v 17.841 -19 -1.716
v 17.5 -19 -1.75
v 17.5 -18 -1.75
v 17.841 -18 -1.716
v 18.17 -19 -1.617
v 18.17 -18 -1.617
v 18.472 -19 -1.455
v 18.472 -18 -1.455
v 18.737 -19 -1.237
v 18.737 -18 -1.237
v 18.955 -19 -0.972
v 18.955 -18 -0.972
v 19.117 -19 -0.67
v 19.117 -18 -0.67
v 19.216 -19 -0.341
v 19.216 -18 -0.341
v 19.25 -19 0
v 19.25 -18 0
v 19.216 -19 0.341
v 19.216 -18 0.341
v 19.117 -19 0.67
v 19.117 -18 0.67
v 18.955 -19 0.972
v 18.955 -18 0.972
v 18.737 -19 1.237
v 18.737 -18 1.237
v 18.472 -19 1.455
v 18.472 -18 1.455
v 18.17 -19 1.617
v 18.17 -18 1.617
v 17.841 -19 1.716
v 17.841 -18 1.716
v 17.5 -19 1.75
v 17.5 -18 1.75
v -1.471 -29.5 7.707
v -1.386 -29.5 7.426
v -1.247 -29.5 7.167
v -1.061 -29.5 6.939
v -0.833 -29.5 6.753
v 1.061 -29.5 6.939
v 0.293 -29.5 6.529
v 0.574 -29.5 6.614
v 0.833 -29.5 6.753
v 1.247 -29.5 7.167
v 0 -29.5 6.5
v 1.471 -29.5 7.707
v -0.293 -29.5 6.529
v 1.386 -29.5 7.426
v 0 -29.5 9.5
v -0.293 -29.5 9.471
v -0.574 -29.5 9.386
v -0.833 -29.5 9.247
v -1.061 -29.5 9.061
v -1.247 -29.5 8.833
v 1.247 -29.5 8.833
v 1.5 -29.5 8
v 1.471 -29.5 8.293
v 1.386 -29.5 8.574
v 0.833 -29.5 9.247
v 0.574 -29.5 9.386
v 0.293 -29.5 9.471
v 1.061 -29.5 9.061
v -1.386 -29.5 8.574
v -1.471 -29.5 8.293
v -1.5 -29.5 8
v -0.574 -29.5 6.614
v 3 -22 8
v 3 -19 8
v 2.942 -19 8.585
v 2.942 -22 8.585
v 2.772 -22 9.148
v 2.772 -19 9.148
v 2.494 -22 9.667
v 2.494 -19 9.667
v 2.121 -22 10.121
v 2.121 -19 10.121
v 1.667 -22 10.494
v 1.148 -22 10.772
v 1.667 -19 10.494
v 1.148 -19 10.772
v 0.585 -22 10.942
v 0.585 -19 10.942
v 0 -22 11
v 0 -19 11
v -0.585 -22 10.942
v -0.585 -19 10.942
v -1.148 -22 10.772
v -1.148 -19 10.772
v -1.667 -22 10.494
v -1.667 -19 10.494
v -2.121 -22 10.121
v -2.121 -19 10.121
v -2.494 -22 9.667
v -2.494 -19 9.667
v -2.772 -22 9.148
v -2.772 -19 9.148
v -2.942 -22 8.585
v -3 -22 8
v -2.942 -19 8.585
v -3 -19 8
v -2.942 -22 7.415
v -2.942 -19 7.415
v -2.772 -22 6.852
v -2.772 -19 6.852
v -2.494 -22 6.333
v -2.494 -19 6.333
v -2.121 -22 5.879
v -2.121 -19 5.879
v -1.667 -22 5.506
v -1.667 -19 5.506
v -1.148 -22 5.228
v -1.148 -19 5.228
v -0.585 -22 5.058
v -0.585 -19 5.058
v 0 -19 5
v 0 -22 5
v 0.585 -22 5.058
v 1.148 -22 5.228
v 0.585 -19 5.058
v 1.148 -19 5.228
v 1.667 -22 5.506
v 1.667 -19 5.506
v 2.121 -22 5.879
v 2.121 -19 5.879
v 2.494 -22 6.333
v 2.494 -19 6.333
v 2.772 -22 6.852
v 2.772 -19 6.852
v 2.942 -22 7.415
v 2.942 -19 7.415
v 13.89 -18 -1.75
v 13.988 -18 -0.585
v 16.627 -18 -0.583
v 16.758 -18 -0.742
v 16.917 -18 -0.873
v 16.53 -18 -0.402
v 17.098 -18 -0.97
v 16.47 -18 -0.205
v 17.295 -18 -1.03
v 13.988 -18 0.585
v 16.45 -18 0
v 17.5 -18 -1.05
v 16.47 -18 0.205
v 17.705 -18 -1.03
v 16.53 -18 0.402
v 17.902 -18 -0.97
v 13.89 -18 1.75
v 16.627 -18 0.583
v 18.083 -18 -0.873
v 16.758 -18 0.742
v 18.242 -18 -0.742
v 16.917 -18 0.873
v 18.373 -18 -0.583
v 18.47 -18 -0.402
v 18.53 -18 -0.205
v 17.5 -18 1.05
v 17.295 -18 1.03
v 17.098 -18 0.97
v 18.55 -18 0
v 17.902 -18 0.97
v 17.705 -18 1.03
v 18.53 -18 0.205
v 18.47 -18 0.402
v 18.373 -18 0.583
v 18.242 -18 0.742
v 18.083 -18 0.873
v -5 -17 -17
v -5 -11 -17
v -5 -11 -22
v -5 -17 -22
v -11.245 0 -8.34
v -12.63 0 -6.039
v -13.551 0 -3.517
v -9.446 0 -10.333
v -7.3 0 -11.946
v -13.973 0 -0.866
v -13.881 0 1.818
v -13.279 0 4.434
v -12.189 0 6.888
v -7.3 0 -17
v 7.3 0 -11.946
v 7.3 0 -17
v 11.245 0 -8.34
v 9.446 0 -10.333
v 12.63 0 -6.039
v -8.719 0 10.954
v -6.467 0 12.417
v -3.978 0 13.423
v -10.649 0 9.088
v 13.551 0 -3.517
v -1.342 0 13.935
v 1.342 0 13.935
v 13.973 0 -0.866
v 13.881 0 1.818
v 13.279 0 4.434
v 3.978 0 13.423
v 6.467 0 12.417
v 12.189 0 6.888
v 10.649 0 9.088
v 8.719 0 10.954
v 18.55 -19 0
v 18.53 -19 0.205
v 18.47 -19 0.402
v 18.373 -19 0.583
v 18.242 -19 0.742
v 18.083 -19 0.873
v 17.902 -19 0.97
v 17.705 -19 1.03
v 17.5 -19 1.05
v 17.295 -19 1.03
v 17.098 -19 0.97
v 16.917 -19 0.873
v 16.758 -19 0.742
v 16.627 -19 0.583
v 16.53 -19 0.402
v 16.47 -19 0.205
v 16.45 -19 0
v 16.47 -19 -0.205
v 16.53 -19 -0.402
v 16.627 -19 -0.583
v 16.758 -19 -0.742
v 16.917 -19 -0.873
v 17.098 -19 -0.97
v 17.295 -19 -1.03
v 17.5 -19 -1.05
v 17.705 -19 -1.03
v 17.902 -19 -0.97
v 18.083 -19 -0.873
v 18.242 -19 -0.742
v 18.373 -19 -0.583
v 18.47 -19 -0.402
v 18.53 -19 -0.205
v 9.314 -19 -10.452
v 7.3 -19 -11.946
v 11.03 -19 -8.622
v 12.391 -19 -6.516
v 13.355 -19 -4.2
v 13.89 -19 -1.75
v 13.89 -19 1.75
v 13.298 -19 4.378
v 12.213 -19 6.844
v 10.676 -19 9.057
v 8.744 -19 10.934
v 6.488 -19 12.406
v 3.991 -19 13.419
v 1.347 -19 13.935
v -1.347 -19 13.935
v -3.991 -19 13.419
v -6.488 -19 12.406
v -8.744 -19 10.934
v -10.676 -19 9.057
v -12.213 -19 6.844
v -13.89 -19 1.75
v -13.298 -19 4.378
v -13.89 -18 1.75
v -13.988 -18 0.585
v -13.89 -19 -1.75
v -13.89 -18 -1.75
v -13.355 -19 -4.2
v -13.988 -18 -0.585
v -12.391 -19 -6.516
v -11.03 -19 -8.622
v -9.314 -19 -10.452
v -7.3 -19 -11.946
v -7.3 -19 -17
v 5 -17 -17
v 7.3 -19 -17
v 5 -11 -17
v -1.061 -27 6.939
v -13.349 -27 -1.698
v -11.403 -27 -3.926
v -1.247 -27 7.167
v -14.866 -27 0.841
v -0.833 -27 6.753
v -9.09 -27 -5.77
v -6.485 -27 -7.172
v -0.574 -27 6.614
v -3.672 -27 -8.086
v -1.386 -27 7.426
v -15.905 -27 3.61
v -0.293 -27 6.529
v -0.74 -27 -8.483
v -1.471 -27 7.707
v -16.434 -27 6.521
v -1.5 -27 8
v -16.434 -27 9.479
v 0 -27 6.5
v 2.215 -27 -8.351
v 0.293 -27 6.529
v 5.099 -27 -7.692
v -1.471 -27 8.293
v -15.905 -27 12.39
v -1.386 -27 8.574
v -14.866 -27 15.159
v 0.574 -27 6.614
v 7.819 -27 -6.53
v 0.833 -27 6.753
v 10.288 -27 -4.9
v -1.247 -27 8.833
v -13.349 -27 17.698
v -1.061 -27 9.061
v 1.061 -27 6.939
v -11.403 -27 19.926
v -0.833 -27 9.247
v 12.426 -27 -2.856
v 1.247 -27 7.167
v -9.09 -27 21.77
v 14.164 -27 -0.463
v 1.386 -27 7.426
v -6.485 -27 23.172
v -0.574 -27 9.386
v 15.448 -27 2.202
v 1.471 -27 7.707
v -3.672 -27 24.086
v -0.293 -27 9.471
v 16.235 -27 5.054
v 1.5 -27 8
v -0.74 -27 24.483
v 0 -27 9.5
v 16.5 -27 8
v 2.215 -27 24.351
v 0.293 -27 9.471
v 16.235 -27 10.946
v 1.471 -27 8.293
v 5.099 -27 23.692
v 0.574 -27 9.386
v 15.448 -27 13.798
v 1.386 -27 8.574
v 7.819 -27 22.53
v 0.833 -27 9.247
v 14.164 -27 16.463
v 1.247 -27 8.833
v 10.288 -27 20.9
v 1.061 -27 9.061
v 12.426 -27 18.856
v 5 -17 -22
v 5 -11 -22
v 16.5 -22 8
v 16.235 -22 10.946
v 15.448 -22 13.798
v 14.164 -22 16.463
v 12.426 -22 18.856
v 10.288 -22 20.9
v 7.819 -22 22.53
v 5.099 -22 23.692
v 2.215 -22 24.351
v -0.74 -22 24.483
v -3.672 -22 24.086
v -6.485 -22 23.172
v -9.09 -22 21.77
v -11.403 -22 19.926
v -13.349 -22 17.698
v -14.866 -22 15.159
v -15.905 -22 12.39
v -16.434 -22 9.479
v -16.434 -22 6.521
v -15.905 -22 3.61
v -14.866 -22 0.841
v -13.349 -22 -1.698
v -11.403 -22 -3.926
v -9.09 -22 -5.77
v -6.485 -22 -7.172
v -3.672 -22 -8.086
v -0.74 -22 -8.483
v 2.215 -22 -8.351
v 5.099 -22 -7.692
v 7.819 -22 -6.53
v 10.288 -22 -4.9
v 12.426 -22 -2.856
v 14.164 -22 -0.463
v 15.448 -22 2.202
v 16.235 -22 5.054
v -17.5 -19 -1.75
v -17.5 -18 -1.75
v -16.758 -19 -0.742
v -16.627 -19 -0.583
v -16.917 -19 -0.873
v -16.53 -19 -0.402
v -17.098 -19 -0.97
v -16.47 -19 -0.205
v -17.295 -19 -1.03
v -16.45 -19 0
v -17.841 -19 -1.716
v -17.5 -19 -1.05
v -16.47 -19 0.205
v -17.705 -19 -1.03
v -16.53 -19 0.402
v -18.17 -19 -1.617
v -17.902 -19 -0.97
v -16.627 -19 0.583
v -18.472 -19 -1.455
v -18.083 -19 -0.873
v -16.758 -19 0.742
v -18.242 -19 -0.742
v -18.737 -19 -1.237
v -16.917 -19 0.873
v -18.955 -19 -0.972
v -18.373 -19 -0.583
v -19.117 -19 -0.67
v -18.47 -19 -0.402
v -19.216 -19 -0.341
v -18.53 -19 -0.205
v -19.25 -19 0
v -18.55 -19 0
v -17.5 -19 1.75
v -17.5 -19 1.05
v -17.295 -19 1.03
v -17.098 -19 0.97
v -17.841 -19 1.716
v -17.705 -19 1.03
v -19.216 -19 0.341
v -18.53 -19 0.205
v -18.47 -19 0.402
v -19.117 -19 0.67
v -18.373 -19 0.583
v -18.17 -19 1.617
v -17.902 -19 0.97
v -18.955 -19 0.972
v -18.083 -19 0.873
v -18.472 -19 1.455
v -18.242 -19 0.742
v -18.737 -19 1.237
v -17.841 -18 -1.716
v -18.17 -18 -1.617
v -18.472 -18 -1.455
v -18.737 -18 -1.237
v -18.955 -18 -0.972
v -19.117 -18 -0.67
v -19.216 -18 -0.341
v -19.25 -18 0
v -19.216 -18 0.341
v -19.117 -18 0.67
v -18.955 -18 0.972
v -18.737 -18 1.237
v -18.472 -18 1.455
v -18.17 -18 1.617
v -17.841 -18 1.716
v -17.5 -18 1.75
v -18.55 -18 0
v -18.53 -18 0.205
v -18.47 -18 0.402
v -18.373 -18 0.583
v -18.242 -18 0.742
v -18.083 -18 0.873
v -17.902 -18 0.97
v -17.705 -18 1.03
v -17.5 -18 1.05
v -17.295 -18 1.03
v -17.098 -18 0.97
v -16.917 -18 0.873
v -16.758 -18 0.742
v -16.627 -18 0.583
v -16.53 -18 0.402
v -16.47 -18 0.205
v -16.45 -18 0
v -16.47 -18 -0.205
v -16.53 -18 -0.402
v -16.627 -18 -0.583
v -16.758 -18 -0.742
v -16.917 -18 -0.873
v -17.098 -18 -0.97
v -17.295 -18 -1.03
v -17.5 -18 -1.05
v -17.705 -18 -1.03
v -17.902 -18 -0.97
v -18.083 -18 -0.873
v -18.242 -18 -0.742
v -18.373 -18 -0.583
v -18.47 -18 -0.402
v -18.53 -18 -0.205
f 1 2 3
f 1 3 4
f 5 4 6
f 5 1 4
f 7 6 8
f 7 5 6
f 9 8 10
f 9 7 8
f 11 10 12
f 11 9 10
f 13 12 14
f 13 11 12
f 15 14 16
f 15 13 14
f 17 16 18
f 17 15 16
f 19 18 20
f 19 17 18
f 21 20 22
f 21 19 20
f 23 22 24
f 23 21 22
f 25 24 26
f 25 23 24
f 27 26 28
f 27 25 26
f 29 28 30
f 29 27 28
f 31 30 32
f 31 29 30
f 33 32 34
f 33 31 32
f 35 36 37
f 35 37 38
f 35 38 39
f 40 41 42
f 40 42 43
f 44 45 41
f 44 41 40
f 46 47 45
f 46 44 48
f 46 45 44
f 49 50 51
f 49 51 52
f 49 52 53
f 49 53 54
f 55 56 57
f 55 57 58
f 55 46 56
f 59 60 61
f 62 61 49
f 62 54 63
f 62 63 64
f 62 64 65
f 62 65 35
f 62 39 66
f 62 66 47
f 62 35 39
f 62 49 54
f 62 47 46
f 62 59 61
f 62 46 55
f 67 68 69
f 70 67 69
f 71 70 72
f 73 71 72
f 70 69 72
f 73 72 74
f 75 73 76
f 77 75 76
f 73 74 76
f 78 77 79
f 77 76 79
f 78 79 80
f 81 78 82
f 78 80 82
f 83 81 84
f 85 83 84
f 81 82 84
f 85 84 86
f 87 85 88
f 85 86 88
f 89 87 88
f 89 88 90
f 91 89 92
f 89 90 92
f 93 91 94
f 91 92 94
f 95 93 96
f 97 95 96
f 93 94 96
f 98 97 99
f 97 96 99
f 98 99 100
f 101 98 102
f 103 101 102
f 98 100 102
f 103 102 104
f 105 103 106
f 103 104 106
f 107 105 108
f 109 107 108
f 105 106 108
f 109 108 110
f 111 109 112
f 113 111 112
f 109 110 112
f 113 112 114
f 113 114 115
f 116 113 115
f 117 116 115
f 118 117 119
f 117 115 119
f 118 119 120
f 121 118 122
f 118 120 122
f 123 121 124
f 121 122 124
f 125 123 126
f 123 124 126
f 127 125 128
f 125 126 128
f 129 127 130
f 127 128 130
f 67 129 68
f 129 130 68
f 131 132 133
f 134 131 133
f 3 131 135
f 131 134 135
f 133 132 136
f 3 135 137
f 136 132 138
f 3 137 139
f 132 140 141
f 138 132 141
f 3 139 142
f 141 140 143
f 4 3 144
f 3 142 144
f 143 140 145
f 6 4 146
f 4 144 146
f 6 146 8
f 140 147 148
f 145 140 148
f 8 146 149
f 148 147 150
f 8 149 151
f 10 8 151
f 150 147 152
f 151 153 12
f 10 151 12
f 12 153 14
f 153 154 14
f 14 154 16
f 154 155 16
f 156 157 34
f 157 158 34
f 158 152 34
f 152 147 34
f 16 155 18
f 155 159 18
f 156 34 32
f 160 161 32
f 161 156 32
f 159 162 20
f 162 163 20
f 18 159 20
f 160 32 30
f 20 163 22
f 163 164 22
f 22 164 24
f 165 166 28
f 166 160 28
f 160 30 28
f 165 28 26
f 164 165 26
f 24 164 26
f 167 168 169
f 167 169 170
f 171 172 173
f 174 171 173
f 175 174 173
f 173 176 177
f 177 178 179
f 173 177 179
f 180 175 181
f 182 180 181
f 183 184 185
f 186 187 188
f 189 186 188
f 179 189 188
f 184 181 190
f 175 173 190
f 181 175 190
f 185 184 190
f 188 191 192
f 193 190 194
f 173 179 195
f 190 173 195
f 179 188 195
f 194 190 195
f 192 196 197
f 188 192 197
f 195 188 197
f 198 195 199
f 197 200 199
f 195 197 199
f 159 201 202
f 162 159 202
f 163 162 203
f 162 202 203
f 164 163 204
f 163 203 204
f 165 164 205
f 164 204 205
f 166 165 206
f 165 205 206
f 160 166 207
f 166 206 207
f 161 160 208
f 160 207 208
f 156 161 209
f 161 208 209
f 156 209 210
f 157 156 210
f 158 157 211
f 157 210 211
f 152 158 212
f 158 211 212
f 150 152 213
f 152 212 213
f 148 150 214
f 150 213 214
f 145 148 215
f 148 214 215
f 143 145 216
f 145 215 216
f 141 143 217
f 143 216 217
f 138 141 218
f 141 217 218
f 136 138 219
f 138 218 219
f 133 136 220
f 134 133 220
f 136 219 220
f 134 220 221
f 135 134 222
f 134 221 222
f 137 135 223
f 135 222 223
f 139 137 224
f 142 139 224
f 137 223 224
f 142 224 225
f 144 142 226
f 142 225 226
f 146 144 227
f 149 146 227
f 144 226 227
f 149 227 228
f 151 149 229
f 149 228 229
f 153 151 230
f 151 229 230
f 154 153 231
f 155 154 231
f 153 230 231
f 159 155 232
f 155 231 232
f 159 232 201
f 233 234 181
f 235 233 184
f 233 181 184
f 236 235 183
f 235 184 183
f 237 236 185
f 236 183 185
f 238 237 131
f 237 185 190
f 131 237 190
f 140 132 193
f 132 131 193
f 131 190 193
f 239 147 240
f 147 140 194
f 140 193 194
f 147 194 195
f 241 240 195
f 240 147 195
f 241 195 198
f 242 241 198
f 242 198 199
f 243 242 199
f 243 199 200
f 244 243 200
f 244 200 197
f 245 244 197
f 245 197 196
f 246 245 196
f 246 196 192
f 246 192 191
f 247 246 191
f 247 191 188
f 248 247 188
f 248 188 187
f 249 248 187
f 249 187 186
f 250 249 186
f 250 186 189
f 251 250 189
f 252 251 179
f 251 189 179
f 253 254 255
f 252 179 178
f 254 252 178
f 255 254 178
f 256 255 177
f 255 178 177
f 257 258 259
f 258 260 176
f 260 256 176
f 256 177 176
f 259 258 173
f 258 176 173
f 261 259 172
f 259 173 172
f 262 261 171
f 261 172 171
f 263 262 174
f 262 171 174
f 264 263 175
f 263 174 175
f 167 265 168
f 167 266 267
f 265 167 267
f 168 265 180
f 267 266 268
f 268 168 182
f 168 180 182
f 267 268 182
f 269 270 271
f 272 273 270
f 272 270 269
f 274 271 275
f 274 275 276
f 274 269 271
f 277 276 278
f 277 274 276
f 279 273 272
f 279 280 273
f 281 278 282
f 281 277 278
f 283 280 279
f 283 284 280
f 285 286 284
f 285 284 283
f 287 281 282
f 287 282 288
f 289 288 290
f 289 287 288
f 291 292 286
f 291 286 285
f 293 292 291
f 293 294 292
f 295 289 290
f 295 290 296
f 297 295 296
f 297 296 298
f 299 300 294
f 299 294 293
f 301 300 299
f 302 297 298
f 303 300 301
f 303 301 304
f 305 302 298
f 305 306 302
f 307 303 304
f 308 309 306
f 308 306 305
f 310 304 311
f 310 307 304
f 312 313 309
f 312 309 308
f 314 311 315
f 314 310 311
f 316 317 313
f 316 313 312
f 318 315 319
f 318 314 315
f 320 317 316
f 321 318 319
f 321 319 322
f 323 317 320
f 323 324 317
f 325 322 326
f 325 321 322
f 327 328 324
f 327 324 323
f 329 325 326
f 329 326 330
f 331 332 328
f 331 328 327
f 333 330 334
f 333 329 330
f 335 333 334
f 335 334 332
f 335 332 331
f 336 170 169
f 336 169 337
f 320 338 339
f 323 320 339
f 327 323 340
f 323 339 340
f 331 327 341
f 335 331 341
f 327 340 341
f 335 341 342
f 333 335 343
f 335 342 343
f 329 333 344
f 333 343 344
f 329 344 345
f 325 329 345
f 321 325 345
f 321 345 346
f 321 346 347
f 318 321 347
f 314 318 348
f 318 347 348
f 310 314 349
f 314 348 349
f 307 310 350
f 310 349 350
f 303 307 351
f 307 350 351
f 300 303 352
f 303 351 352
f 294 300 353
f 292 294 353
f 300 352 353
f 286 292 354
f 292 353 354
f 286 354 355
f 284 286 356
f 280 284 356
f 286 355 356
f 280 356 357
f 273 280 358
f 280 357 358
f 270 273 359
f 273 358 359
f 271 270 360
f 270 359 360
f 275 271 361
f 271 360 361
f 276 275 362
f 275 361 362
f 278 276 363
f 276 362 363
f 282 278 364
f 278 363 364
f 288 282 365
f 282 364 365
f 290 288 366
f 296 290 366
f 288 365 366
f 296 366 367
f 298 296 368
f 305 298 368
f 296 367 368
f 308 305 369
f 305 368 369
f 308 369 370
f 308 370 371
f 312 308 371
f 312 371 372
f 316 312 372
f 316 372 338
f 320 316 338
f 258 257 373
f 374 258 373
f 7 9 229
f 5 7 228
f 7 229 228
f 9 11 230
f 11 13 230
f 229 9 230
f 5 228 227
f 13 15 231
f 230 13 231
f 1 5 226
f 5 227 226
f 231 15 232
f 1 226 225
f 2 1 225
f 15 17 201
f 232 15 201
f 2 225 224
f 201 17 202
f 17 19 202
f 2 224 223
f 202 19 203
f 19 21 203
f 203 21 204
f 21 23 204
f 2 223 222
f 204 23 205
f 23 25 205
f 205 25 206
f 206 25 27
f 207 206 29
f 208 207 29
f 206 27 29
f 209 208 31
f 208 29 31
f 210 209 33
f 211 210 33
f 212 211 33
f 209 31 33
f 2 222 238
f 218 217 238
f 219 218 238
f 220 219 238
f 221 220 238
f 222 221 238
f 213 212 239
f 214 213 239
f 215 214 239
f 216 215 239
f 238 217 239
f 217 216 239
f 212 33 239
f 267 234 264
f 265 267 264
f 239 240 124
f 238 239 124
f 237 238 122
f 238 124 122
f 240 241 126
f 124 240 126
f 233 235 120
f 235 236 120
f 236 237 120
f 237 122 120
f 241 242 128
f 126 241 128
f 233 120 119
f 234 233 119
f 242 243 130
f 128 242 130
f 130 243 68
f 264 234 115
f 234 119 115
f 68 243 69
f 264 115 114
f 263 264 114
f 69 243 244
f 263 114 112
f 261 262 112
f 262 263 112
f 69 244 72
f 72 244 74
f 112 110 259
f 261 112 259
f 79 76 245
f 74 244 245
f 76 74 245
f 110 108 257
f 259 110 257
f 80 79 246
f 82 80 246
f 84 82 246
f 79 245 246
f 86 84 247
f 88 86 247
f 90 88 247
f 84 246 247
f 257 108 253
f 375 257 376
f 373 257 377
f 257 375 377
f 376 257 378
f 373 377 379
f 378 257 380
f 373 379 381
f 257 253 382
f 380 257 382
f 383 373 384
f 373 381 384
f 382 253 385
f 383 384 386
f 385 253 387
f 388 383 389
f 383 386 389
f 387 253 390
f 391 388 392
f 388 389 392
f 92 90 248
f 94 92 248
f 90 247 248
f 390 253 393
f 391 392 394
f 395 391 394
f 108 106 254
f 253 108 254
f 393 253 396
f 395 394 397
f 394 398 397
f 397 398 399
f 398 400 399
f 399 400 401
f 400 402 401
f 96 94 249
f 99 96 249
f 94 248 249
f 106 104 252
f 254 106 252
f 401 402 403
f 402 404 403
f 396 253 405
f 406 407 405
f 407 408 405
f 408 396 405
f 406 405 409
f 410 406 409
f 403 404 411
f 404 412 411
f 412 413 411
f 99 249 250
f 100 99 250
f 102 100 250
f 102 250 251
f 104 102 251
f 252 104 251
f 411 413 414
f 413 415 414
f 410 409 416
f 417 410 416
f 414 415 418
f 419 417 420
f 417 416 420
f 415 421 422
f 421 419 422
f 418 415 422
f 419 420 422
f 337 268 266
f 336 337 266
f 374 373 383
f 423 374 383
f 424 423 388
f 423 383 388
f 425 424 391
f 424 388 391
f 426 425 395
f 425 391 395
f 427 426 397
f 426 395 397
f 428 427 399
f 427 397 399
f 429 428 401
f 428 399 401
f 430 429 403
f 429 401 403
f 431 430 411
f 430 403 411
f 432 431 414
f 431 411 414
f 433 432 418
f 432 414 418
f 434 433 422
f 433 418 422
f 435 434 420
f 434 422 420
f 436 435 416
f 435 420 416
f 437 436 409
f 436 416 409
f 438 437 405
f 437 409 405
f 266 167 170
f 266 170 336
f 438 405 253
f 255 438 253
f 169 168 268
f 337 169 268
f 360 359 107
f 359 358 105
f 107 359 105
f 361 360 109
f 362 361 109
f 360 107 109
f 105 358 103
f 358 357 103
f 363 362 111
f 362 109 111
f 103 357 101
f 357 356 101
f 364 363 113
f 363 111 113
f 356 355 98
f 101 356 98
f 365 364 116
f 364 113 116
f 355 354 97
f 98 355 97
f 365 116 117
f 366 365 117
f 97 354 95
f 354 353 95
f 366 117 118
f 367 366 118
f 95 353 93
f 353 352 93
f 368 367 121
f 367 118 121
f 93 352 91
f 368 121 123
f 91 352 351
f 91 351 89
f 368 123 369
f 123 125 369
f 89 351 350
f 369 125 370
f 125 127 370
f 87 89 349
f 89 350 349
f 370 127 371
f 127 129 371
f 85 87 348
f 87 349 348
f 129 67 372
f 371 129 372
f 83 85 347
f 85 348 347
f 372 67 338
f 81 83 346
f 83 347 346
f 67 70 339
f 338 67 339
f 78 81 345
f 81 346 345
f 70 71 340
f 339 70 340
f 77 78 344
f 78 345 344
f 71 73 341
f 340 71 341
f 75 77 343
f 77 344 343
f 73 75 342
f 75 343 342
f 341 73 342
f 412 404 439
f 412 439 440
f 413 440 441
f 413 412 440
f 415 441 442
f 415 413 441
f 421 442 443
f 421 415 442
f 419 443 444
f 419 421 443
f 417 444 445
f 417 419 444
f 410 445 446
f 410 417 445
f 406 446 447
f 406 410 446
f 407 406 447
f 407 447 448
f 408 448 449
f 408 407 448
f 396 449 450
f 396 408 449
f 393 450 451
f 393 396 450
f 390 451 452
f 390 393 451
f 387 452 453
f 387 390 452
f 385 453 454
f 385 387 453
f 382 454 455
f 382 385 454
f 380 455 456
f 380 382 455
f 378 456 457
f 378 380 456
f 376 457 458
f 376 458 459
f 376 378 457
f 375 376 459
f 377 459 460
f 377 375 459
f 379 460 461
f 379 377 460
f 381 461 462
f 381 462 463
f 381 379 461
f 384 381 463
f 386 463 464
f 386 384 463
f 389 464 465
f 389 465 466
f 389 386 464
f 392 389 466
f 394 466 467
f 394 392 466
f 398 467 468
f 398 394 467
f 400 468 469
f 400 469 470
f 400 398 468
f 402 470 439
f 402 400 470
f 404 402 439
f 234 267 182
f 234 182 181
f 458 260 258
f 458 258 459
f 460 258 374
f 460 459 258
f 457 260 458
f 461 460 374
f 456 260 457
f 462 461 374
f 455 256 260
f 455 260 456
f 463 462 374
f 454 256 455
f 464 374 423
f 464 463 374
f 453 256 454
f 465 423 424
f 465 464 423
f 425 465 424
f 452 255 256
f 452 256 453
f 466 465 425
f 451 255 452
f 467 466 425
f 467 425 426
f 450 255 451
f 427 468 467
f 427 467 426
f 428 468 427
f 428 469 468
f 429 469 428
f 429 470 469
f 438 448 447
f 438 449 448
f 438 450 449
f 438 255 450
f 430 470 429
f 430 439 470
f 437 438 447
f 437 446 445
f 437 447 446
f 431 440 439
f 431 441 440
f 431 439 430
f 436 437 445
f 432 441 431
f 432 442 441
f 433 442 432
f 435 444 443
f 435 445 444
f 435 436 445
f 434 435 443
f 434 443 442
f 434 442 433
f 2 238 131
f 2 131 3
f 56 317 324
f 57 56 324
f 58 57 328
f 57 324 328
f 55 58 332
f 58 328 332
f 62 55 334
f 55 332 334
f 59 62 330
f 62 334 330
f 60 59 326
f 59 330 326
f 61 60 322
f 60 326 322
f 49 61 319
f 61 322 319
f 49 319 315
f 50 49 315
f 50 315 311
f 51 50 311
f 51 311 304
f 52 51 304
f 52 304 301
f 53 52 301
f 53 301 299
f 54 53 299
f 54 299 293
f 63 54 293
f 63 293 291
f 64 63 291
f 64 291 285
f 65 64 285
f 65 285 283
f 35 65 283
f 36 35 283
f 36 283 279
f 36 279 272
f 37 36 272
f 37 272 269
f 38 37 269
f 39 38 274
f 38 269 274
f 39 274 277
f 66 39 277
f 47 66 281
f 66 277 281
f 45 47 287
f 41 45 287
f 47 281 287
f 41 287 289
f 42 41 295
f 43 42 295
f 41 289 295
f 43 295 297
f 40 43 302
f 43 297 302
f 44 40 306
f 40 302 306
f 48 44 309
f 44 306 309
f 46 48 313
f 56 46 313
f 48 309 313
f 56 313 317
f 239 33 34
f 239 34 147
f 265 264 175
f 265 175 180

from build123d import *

# Parameters (mm, degrees)
F1_DEPTH  = 19
F2_R      = 3
F3_DEPTH  = 3
F4_R      = 1.5
F5_DEPTH  = 7.5
F6_R      = 1.05
F7_DEPTH  = 1
F8_R      = 16.5
F9_DEPTH  = 5
F10_W     = 10
F10_H     = 6
F11_DEPTH = 5


# Not quite as in the source:
# - a pattern or mirror of a feature is missing from the dataset's text; its kind, count and spacing are read off the source's solid


with BuildPart() as f1:
    # F0 (on Front) → F1 (new body)
    with BuildSketch(Plane.XZ):
        with BuildLine():
            Line((7.3, -17), (7.3, -11.9461290802))
            ThreePointArc((7.3, -11.9461290802), (0, 14), (-7.3, -11.9461290802))
            Line((-7.3, -11.9461290802), (-7.3, -17))
            Line((-7.3, -17), (7.3, -17))
        make_face()
    extrude(amount=F1_DEPTH)

    # F2 (on face) → F3 (join)
    with BuildSketch(Plane.XZ.offset(19)):
        with Locations((0, 8)):
            Circle(F2_R)
    extrude(amount=F3_DEPTH)

    # F4 (on face) → F5 (join)
    with BuildSketch(Plane.XZ.offset(22)):
        with Locations((0, 8)):
            Circle(F4_R)
    extrude(amount=F5_DEPTH)

    # F6 (on face) → F7 (join)
    with BuildSketch(Plane.XZ.offset(19)):
        with BuildLine():
            Line((13.8901943831, -1.75), (17.5, -1.75))
            ThreePointArc((17.5, -1.75), (19.25, 0), (17.5, 1.75))
            Line((17.5, 1.75), (13.8901943831, 1.75))
            Line((13.8901943831, 1.75), (13.8901943831, -1.75))
        make_face()
        with Locations((17.5, 0)):
            Circle(F6_R, mode=Mode.SUBTRACT)
    f7 = extrude(amount=-F7_DEPTH)

    # F7_copies: F7 across plane
    add(f7.mirror(Plane(origin=(0, 0, 0), x_dir=(0, 0, -1), z_dir=(-1, 0, 0))))

    # F8 (on face) → F9 (join)
    with BuildSketch(Plane.XZ.offset(22)):
        with Locations((0, 8)):
            Circle(F8_R)
    extrude(amount=F9_DEPTH)

    # F10 (on face) → F11 (join)
    with BuildSketch(Plane(origin=(0, 0, -17), x_dir=(1, 0, 0), z_dir=(0, 0, -1))):
        with Locations((0, 14)):
            Rectangle(F10_W, F10_H)
    extrude(amount=F11_DEPTH)


solid = f1.part
